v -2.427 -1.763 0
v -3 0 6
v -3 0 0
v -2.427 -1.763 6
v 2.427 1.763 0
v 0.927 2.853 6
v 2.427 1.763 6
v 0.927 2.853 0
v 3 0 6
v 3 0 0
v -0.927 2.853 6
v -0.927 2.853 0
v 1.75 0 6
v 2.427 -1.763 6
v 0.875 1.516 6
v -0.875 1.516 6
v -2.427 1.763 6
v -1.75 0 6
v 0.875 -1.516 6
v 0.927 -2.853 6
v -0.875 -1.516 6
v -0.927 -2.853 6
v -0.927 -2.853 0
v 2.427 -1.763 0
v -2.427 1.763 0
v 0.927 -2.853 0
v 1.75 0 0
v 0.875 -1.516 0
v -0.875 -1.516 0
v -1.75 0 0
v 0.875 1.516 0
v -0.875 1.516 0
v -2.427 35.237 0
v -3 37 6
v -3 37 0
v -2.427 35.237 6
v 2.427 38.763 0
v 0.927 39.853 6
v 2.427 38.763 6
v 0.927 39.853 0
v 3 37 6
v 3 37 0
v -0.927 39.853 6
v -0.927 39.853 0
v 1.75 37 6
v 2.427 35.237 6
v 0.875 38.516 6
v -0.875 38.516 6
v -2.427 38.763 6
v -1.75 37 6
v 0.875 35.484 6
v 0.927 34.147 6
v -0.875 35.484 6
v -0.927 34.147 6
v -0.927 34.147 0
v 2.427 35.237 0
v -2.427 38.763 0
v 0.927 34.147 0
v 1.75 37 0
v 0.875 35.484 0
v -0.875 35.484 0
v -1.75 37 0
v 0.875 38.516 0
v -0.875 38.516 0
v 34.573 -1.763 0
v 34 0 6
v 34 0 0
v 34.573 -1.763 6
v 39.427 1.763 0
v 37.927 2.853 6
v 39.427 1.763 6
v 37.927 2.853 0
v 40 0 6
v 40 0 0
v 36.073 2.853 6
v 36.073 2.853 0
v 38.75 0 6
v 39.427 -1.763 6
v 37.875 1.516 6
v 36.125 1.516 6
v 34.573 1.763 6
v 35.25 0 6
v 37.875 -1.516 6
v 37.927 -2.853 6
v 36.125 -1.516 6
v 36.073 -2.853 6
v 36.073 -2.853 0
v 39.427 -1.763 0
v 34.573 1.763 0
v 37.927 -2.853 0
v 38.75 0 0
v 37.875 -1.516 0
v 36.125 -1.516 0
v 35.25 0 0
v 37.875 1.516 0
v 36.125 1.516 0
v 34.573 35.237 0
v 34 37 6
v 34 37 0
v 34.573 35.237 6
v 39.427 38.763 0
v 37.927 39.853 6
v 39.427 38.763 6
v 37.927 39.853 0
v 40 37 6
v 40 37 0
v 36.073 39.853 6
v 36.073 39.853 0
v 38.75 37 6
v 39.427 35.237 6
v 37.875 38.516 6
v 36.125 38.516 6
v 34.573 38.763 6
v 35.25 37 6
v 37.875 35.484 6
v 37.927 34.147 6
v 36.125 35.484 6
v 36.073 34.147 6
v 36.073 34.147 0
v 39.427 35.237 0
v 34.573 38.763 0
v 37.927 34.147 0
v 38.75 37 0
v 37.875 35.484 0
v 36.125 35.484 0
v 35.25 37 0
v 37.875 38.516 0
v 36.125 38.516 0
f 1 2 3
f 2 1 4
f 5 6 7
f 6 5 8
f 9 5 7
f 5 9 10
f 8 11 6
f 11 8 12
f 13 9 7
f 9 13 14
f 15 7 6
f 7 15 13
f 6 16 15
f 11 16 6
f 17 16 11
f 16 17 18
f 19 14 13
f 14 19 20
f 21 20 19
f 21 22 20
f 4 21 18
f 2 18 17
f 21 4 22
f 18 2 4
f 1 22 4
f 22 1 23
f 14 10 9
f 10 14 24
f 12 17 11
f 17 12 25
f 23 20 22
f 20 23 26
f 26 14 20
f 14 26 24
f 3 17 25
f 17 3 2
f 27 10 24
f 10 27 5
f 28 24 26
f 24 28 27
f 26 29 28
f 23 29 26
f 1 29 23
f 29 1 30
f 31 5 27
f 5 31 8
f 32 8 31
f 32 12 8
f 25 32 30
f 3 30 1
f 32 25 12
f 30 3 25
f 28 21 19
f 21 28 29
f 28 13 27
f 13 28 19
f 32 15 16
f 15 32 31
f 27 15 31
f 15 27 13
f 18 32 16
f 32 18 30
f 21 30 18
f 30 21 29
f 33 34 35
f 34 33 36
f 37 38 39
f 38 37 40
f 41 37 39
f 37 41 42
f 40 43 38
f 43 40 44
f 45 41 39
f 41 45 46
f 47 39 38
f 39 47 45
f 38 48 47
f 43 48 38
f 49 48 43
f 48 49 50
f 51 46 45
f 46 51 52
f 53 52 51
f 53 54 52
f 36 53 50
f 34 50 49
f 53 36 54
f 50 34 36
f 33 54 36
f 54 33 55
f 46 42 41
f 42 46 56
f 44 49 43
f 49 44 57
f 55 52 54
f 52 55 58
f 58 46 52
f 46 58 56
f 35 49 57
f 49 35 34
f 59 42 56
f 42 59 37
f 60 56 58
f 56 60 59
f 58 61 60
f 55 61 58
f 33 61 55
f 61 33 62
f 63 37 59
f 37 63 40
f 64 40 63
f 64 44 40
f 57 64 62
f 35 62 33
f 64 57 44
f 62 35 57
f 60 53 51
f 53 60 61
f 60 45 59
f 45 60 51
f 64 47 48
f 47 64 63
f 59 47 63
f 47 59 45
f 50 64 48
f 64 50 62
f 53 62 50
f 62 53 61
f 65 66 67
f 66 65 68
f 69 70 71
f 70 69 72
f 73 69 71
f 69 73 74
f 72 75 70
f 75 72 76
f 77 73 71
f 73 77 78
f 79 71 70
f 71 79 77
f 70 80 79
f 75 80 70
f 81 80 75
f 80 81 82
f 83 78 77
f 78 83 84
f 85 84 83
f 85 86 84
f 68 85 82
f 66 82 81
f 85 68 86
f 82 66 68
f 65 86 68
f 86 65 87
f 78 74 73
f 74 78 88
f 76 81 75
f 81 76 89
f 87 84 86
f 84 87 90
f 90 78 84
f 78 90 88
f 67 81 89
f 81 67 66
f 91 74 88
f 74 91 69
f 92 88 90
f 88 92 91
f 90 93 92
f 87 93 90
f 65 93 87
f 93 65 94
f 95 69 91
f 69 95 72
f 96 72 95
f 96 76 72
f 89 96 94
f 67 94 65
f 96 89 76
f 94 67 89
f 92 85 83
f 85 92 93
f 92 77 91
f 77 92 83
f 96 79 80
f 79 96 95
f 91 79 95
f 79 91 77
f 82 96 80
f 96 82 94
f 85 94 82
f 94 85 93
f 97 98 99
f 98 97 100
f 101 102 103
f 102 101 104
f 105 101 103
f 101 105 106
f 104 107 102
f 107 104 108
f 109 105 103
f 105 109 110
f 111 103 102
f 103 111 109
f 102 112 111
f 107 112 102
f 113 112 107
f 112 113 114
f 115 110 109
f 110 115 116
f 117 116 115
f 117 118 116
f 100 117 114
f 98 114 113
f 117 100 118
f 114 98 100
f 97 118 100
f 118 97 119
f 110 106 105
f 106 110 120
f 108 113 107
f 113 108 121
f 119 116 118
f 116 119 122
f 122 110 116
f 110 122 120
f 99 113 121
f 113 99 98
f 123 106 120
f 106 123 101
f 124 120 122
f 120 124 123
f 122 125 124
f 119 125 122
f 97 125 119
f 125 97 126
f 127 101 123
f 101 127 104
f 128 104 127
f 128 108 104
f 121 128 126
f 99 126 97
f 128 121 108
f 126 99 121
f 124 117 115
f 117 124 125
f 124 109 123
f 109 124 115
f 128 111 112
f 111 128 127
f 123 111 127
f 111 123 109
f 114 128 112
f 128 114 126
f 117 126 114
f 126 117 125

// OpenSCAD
// file: standoff.scad
standoff_default_height = 6;
standoff_outer_radius = 3;
standoff_inner_radius = 1.75;	// hole on board is 1.6mm, 1.75 gives room for the bolts

standoff();

module standoff(standoff_height = standoff_default_height) {
	difference() {
		cylinder(r=standoff_outer_radius, h=standoff_height);
		cylinder(r=standoff_inner_radius, h=standoff_height);
	}
}
// main file
use <standoff.scad>

spacing = 37;

for (x = [0:1]){
	for (y = [0:1]){
		translate([x * spacing, y * spacing, 0])standoff();
	}
}
